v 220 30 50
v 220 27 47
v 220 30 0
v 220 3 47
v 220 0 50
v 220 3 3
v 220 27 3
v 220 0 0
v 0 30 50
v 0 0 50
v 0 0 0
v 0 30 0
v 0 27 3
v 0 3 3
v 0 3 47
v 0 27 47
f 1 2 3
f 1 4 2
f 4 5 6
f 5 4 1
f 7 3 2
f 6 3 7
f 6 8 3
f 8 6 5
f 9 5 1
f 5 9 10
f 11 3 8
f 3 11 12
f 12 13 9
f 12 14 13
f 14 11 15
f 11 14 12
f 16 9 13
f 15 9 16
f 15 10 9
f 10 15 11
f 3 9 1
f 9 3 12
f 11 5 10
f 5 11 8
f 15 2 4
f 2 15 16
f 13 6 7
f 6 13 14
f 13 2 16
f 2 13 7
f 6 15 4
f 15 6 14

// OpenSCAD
$fn = 32;

// ----------------------------------------------------------------------
// Box beam: 200-250 mm hollow beam
// ----------------------------------------------------------------------

// --- parameters (mm) ---
beam_l = 220;             // beam length, X
beam_w = 30;              // beam width, Y
beam_h = 50;              // beam height, Z
wall = 3;                 // wall thickness

difference() {
  cube([beam_l, beam_w, beam_h]);
  translate([-1, wall, wall])
    cube([beam_l + 2, beam_w - 2 * wall, beam_h - 2 * wall]);
}
